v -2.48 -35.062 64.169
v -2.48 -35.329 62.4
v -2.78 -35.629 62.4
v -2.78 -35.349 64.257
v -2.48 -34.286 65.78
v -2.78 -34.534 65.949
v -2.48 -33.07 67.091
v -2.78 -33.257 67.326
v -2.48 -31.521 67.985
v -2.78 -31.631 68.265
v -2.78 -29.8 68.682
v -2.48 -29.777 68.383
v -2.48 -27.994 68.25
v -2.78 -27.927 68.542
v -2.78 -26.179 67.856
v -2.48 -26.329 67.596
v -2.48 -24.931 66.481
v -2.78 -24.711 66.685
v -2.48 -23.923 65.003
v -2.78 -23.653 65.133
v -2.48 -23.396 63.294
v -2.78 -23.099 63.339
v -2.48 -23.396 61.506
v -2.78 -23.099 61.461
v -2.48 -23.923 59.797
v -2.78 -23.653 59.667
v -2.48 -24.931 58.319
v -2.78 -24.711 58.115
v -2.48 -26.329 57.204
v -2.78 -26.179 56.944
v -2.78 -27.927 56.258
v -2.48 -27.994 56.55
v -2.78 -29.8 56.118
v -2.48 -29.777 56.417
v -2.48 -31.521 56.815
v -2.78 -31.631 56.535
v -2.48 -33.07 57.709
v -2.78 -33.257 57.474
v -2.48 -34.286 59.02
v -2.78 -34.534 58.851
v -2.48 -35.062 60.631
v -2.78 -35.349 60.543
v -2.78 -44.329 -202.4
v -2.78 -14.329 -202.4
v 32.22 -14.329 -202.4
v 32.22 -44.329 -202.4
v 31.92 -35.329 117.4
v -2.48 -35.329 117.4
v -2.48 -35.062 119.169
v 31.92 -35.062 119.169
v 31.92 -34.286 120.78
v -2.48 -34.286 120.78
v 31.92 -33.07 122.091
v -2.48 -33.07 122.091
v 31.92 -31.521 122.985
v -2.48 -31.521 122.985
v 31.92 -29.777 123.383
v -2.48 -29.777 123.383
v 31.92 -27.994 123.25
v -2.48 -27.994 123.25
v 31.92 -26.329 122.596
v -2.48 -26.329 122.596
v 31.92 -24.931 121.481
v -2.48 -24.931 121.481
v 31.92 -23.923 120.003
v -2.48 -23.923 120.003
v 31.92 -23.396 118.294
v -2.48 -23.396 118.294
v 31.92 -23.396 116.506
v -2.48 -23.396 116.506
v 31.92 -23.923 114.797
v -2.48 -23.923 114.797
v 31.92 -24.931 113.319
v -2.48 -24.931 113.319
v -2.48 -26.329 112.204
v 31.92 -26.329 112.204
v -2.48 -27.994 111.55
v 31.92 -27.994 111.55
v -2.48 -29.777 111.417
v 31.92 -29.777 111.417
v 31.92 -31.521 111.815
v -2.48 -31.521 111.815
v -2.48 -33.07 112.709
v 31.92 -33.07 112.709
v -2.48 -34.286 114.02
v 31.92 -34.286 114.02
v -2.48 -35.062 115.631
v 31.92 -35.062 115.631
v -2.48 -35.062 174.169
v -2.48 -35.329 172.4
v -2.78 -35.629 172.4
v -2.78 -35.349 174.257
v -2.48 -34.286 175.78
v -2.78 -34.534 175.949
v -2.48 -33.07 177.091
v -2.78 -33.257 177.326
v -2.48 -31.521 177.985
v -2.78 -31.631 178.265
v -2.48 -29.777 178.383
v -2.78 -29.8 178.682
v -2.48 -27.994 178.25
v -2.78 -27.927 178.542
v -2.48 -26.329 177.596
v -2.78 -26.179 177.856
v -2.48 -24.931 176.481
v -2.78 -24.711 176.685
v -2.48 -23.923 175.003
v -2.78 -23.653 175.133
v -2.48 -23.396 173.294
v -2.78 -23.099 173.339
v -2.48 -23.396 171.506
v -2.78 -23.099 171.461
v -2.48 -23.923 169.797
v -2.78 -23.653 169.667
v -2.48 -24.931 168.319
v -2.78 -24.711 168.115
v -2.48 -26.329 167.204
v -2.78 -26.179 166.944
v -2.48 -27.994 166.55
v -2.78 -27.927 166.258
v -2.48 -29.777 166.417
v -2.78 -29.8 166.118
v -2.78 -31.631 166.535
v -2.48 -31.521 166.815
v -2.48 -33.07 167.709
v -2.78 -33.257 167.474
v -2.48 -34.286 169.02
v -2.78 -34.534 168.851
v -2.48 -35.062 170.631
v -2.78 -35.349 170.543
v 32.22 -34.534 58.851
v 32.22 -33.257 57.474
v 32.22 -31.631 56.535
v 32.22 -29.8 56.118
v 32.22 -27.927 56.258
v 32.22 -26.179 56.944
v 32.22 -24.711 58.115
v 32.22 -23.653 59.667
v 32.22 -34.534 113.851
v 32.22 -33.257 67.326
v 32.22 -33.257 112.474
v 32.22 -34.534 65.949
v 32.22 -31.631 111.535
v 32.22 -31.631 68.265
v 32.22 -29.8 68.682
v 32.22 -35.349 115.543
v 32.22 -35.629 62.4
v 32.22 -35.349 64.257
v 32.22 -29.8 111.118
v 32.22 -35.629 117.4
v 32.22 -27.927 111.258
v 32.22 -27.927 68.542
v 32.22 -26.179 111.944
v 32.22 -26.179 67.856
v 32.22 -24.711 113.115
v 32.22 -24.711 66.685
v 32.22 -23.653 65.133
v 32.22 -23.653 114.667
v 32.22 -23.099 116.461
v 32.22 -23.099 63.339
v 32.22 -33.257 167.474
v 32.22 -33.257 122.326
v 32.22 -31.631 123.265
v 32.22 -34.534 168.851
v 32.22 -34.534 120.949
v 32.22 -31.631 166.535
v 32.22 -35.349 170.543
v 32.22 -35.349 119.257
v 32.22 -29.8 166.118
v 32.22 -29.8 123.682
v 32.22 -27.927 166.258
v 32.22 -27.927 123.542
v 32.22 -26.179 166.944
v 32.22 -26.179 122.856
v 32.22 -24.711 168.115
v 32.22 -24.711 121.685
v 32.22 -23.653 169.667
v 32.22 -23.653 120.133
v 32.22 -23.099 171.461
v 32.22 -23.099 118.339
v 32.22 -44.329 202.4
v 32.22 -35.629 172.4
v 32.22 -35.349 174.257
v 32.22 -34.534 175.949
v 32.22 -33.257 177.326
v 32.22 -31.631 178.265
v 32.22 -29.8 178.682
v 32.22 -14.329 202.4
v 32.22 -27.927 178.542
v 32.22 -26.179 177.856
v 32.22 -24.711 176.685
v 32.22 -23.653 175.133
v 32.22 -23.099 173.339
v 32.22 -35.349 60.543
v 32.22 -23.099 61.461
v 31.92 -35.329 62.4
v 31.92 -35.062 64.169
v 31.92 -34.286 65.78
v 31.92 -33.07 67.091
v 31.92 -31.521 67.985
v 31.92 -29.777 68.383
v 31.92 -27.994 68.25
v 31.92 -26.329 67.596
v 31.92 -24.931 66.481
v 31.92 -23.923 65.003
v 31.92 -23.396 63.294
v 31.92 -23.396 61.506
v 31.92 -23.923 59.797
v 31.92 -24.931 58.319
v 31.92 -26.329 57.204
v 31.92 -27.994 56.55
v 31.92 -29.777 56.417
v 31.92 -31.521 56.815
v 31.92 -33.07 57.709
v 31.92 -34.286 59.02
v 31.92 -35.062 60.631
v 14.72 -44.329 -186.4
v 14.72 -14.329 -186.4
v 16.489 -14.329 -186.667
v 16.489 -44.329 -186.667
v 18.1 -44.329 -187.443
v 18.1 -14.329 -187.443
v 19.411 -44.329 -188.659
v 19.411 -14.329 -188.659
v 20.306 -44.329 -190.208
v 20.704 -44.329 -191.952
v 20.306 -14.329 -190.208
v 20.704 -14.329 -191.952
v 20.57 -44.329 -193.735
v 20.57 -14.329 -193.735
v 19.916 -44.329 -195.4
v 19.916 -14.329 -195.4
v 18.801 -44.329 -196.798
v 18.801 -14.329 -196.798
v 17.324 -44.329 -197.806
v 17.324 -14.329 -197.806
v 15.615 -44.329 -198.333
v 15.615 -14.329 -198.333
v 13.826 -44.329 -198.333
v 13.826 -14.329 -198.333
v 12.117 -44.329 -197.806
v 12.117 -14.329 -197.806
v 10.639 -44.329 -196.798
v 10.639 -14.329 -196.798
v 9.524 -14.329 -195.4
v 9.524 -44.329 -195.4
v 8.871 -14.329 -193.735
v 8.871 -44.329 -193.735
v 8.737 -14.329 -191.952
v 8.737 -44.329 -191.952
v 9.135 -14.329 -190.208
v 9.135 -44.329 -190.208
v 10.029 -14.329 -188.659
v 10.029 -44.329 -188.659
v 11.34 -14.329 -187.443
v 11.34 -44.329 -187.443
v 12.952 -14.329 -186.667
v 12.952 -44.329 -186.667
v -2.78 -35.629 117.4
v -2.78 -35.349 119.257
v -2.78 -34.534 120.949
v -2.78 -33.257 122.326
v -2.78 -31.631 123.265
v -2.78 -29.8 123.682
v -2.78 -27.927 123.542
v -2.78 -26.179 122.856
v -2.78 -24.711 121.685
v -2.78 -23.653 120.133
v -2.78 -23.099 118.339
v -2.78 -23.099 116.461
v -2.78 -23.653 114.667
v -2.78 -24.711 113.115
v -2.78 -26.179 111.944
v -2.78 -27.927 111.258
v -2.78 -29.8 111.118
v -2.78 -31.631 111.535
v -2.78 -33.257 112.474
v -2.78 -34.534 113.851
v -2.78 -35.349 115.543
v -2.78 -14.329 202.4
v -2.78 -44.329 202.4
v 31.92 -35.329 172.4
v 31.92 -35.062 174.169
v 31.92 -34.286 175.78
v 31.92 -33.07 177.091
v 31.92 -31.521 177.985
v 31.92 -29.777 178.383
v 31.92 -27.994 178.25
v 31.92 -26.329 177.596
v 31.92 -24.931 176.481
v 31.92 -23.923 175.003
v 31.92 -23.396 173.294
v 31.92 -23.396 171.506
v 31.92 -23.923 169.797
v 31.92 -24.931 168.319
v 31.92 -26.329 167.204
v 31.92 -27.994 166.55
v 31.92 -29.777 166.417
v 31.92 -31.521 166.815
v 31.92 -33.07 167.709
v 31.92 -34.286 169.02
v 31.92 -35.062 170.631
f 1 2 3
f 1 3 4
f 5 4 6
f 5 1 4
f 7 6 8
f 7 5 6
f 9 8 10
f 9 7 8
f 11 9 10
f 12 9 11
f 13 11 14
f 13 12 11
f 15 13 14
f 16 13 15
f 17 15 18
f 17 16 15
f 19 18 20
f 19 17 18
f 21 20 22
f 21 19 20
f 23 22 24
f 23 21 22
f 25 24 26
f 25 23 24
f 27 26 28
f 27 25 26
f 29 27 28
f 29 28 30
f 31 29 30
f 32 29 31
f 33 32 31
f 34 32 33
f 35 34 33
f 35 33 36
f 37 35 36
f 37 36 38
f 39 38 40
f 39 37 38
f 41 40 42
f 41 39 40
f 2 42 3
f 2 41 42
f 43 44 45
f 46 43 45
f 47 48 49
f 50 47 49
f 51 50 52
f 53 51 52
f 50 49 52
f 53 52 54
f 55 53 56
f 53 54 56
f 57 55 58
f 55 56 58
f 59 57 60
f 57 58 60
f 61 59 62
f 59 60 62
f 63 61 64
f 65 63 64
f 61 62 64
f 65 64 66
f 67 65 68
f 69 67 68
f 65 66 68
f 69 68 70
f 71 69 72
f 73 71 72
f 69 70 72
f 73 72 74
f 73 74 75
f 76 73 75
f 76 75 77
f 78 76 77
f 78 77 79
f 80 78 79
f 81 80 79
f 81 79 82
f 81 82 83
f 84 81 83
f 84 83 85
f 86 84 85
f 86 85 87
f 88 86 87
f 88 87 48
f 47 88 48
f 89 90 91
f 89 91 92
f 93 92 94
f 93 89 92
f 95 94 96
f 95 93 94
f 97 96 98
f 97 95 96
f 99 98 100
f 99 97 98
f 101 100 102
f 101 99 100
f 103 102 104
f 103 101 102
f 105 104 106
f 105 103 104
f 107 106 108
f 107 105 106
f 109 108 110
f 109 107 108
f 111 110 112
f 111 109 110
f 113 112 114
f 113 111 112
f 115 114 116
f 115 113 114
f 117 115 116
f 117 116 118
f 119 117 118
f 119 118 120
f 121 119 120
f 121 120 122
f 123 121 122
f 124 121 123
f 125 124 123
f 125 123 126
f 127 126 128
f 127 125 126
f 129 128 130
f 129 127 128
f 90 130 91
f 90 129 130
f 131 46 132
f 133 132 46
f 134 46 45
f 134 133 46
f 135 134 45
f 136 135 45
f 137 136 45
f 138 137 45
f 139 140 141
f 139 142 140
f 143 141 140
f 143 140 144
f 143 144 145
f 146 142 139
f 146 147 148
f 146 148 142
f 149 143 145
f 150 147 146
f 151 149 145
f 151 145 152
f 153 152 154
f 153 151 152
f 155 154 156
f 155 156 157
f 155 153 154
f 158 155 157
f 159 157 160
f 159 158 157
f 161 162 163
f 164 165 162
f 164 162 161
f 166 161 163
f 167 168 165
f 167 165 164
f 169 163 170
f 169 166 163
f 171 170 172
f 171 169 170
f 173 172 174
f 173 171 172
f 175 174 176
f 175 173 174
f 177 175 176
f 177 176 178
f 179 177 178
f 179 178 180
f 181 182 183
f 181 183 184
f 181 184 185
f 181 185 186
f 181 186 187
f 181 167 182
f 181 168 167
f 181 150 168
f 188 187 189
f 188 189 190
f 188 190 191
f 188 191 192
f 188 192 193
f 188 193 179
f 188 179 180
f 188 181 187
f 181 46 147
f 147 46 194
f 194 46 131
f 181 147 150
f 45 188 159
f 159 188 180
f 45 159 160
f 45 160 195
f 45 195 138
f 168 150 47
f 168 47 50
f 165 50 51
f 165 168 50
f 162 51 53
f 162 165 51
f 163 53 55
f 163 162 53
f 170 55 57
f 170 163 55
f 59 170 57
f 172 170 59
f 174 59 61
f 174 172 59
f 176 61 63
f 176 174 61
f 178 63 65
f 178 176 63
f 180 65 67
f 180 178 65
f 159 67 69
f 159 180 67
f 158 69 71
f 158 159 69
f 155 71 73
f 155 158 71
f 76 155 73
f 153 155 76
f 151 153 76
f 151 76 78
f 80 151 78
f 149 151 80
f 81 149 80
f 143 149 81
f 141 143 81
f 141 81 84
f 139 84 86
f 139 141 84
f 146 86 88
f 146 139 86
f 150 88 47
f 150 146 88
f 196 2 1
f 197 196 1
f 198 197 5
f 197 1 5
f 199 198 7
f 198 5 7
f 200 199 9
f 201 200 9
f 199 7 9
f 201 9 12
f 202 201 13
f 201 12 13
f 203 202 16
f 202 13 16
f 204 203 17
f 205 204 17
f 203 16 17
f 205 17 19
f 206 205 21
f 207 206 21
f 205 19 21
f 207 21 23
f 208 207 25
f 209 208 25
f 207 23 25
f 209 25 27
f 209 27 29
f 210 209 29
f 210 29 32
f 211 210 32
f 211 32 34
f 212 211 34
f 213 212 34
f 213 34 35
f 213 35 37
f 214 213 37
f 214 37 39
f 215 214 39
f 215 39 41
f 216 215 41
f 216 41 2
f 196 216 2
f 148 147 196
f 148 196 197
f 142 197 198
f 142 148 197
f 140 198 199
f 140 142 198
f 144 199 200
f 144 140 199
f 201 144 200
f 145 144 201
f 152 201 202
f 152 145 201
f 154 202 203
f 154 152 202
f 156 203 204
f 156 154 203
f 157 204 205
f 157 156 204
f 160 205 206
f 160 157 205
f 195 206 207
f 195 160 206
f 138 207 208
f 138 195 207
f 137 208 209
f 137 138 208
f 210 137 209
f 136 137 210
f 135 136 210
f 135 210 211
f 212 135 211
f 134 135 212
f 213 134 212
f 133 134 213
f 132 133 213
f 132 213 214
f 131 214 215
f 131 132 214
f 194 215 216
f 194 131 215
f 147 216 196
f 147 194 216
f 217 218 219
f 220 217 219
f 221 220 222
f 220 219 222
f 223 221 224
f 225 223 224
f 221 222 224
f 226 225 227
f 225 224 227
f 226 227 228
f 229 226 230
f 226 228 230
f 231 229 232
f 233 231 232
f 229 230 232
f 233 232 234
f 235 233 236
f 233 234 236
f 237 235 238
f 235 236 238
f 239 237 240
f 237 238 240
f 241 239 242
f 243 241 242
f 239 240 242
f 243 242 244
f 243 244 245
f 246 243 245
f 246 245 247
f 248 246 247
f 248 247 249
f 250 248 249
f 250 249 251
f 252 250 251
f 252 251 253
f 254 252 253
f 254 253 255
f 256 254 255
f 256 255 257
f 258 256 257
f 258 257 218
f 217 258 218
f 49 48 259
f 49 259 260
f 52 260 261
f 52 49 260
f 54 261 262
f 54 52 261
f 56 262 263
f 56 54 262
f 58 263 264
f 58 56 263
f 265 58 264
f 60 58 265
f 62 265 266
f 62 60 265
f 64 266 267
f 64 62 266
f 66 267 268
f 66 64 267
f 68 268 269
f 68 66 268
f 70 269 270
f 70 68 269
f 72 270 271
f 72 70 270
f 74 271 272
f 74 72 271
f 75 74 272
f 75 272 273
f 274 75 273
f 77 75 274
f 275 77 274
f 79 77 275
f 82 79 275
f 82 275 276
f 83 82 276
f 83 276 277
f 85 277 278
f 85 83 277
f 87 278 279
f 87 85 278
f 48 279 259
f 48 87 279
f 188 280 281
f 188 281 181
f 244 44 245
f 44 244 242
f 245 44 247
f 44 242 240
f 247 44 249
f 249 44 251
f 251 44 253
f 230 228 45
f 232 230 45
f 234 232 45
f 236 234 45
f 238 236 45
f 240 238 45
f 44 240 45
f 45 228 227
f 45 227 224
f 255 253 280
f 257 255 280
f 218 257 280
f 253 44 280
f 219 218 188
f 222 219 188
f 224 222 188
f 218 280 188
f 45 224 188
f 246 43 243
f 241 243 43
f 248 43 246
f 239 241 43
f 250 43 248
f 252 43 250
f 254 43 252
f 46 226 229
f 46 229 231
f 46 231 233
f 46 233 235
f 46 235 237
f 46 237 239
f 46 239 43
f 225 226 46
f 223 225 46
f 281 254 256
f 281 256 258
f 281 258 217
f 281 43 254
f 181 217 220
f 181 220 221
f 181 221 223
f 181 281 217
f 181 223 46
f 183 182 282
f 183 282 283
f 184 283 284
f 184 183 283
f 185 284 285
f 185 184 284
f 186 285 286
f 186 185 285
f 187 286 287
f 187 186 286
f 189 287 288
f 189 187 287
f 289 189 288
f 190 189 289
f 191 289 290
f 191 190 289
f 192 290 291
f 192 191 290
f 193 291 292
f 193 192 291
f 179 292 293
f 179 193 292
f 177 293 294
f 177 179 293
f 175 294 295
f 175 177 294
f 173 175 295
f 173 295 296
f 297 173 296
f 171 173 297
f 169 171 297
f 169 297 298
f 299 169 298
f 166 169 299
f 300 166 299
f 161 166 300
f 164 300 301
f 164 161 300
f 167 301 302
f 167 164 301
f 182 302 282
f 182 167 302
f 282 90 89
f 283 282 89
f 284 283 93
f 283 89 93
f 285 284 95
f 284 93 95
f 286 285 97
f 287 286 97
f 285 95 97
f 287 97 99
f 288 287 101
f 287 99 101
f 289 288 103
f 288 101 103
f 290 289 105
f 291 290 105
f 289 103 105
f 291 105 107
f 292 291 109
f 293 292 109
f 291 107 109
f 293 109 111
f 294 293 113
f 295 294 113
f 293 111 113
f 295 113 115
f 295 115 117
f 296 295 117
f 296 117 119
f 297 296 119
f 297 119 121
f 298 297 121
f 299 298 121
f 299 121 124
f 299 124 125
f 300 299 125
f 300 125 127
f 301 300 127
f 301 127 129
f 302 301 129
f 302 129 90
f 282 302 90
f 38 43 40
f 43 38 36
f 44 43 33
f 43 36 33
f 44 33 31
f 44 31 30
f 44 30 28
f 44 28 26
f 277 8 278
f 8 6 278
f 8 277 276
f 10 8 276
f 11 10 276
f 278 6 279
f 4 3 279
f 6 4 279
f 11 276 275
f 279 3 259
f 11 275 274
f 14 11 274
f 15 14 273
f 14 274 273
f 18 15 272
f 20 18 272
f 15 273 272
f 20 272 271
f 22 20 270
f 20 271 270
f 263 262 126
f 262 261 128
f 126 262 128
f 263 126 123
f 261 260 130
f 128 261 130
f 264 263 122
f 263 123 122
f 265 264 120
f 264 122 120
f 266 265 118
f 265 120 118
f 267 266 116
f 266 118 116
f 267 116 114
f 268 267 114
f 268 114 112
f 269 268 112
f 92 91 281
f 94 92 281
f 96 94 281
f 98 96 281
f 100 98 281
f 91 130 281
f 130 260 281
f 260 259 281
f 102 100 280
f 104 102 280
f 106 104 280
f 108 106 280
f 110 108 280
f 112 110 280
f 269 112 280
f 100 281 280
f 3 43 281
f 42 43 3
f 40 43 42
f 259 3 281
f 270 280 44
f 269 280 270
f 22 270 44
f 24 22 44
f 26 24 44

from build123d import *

# Parameters (mm, degrees)
SKETCH1_W           = 35
SKETCH1_H           = 30
BOSS_EXTRUDE1_DEPTH = 202.4
SKETCH4_R           = 6
CUT_EXTRUDE1_DEPTH  = 211.132863092
SKETCH5_R           = 6
CUT_EXTRUDE2_DEPTH  = 208.132591643
CHAMFER1_SIZE       = 0.3


with BuildPart() as part:
    # Sketch1 → Boss-Extrude1 (new, symmetric)
    with BuildSketch(Plane.XY):
        with Locations((14.720343273, -29.328998989)):
            Rectangle(SKETCH1_W, SKETCH1_H)
    extrude(amount=BOSS_EXTRUDE1_DEPTH, both=True)

    # Sketch4 → Cut-Extrude1 (cut, through all)
    with BuildSketch(Plane.ZY.offset(2.779656727)):
        with Locations(Location((172.4, -29.328998989, 0), (0, 0, 270))):
            Circle(SKETCH4_R)
        with Locations(Location((62.4, -29.328998989, 0), (0, 0, 270))):
            Circle(SKETCH4_R)
        with Locations(Location((117.4, -29.328998989, 0), (0, 0, 270))):
            Circle(SKETCH4_R)
    extrude(amount=-CUT_EXTRUDE1_DEPTH, mode=Mode.SUBTRACT)

    # Sketch5 → Cut-Extrude2 (cut, through all)
    with BuildSketch(Plane(origin=(0, -14.328998989, 0), x_dir=(1, 0, 0), z_dir=(0, 1, 0))):
        with Locations(Location((14.720343273, 192.4, 0), (0, 0, 270))):
            Circle(SKETCH5_R)
    extrude(amount=-CUT_EXTRUDE2_DEPTH, mode=Mode.SUBTRACT)

    # Chamfer1
    chamfer1_edges = [part.edges().sort_by_distance(p)[0] for p in [
        (32.220343273, -23.328998989, 172.4),
        (-2.779656727, -23.328998989, 172.4),
        (32.220343273, -23.328998989, 62.4),
        (-2.779656727, -23.328998989, 62.4),
        (32.220343273, -23.328998989, 117.4),
        (-2.779656727, -23.328998989, 117.4),
    ]]
    chamfer(chamfer1_edges, length=CHAMFER1_SIZE)


solid = part.part
